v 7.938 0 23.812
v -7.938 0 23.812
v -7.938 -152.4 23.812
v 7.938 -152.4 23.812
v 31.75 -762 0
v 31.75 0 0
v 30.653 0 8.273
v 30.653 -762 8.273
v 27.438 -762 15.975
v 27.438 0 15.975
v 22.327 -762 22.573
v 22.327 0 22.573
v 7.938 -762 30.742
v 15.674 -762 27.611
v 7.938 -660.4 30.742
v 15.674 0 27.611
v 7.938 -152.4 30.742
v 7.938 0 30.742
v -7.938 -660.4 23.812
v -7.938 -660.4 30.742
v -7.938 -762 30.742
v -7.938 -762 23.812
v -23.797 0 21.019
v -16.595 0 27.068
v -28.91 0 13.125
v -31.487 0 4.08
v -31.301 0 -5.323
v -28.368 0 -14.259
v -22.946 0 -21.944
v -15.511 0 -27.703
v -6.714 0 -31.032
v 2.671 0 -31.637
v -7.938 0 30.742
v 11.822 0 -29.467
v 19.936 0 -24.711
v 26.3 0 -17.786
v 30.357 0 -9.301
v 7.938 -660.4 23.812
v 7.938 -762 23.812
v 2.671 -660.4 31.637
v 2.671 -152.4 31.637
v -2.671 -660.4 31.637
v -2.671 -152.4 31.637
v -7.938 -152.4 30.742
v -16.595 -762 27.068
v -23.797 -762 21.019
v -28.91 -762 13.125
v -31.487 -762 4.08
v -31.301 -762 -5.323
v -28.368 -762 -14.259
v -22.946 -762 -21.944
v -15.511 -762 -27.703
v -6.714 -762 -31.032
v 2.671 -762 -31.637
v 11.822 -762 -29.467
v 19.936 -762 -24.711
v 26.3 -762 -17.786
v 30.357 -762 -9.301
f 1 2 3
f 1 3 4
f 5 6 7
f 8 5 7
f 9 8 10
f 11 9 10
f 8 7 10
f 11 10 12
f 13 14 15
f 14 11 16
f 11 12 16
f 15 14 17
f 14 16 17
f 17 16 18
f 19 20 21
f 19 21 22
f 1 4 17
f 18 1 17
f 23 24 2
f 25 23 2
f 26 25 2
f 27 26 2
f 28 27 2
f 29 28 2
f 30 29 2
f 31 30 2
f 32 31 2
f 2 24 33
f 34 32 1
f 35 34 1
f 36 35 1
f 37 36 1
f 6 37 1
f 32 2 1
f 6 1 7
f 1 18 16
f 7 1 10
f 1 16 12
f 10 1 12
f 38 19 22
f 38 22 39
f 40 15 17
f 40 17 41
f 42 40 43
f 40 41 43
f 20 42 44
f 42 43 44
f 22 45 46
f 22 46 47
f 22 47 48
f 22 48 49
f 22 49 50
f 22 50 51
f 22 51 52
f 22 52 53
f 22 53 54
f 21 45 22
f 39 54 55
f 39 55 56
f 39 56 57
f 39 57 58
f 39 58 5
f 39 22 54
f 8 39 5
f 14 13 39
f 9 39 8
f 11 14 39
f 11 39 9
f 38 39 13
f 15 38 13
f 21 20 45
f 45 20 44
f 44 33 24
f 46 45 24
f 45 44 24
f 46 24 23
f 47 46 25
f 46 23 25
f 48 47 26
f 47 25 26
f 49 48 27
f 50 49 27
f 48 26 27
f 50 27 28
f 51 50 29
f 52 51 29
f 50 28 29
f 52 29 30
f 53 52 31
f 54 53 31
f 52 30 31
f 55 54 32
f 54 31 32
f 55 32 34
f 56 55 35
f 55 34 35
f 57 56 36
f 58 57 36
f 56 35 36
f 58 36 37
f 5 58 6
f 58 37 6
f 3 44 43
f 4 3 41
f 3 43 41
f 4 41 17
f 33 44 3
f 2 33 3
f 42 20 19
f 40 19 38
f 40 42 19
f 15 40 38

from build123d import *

# Parameters (mm, degrees)
F1_DEPTH = 762
F2_DEPTH = 152.4
F4_DEPTH = 101.6


with BuildPart() as f1:
    # F0 (on Front) → F1 (new body)
    with BuildSketch(Plane.XZ):
        with BuildLine():
            ThreePointArc((-7.9375, 30.741805), (-19.442825, -25.100579), (31.75, 0))
            ThreePointArc((31.75, 0), (25.100579, 19.442825), (7.9375, 30.741805))
            Line((7.9375, 30.741805), (7.9375, 23.8125))
            Line((7.9375, 23.8125), (-7.9375, 23.8125))
            Line((-7.9375, 23.8125), (-7.9375, 30.741805))
        make_face()
        with BuildLine():
            Line((7.9375, 23.8125), (7.9375, 30.741805))
            ThreePointArc((7.9375, 30.741805), (0, 31.75), (-7.9375, 30.741805))
            Line((-7.9375, 30.741805), (-7.9375, 23.8125))
            Line((-7.9375, 23.8125), (7.9375, 23.8125))
        make_face()
    extrude(amount=F1_DEPTH)

    # F0 (on Front) → F2 (cut)
    with BuildSketch(Plane.XZ):
        with BuildLine():
            Line((7.9375, 23.8125), (7.9375, 30.741805))
            ThreePointArc((7.9375, 30.741805), (0, 31.75), (-7.9375, 30.741805))
            Line((-7.9375, 30.741805), (-7.9375, 23.8125))
            Line((-7.9375, 23.8125), (7.9375, 23.8125))
        make_face()
    extrude(amount=F2_DEPTH, mode=Mode.SUBTRACT)

    # F3 (on face) → F4 (cut)
    with BuildSketch(Plane.XZ.offset(762)):
        with BuildLine():
            Line((-7.9375, 23.8125), (7.9375, 23.8125))
            Line((7.9375, 23.8125), (7.9375, 30.741805))
            ThreePointArc((7.9375, 30.741805), (0, 31.75), (-7.9375, 30.741805))
            Line((-7.9375, 30.741805), (-7.9375, 23.8125))
        make_face()
    extrude(amount=-F4_DEPTH, mode=Mode.SUBTRACT)


solid = f1.part
